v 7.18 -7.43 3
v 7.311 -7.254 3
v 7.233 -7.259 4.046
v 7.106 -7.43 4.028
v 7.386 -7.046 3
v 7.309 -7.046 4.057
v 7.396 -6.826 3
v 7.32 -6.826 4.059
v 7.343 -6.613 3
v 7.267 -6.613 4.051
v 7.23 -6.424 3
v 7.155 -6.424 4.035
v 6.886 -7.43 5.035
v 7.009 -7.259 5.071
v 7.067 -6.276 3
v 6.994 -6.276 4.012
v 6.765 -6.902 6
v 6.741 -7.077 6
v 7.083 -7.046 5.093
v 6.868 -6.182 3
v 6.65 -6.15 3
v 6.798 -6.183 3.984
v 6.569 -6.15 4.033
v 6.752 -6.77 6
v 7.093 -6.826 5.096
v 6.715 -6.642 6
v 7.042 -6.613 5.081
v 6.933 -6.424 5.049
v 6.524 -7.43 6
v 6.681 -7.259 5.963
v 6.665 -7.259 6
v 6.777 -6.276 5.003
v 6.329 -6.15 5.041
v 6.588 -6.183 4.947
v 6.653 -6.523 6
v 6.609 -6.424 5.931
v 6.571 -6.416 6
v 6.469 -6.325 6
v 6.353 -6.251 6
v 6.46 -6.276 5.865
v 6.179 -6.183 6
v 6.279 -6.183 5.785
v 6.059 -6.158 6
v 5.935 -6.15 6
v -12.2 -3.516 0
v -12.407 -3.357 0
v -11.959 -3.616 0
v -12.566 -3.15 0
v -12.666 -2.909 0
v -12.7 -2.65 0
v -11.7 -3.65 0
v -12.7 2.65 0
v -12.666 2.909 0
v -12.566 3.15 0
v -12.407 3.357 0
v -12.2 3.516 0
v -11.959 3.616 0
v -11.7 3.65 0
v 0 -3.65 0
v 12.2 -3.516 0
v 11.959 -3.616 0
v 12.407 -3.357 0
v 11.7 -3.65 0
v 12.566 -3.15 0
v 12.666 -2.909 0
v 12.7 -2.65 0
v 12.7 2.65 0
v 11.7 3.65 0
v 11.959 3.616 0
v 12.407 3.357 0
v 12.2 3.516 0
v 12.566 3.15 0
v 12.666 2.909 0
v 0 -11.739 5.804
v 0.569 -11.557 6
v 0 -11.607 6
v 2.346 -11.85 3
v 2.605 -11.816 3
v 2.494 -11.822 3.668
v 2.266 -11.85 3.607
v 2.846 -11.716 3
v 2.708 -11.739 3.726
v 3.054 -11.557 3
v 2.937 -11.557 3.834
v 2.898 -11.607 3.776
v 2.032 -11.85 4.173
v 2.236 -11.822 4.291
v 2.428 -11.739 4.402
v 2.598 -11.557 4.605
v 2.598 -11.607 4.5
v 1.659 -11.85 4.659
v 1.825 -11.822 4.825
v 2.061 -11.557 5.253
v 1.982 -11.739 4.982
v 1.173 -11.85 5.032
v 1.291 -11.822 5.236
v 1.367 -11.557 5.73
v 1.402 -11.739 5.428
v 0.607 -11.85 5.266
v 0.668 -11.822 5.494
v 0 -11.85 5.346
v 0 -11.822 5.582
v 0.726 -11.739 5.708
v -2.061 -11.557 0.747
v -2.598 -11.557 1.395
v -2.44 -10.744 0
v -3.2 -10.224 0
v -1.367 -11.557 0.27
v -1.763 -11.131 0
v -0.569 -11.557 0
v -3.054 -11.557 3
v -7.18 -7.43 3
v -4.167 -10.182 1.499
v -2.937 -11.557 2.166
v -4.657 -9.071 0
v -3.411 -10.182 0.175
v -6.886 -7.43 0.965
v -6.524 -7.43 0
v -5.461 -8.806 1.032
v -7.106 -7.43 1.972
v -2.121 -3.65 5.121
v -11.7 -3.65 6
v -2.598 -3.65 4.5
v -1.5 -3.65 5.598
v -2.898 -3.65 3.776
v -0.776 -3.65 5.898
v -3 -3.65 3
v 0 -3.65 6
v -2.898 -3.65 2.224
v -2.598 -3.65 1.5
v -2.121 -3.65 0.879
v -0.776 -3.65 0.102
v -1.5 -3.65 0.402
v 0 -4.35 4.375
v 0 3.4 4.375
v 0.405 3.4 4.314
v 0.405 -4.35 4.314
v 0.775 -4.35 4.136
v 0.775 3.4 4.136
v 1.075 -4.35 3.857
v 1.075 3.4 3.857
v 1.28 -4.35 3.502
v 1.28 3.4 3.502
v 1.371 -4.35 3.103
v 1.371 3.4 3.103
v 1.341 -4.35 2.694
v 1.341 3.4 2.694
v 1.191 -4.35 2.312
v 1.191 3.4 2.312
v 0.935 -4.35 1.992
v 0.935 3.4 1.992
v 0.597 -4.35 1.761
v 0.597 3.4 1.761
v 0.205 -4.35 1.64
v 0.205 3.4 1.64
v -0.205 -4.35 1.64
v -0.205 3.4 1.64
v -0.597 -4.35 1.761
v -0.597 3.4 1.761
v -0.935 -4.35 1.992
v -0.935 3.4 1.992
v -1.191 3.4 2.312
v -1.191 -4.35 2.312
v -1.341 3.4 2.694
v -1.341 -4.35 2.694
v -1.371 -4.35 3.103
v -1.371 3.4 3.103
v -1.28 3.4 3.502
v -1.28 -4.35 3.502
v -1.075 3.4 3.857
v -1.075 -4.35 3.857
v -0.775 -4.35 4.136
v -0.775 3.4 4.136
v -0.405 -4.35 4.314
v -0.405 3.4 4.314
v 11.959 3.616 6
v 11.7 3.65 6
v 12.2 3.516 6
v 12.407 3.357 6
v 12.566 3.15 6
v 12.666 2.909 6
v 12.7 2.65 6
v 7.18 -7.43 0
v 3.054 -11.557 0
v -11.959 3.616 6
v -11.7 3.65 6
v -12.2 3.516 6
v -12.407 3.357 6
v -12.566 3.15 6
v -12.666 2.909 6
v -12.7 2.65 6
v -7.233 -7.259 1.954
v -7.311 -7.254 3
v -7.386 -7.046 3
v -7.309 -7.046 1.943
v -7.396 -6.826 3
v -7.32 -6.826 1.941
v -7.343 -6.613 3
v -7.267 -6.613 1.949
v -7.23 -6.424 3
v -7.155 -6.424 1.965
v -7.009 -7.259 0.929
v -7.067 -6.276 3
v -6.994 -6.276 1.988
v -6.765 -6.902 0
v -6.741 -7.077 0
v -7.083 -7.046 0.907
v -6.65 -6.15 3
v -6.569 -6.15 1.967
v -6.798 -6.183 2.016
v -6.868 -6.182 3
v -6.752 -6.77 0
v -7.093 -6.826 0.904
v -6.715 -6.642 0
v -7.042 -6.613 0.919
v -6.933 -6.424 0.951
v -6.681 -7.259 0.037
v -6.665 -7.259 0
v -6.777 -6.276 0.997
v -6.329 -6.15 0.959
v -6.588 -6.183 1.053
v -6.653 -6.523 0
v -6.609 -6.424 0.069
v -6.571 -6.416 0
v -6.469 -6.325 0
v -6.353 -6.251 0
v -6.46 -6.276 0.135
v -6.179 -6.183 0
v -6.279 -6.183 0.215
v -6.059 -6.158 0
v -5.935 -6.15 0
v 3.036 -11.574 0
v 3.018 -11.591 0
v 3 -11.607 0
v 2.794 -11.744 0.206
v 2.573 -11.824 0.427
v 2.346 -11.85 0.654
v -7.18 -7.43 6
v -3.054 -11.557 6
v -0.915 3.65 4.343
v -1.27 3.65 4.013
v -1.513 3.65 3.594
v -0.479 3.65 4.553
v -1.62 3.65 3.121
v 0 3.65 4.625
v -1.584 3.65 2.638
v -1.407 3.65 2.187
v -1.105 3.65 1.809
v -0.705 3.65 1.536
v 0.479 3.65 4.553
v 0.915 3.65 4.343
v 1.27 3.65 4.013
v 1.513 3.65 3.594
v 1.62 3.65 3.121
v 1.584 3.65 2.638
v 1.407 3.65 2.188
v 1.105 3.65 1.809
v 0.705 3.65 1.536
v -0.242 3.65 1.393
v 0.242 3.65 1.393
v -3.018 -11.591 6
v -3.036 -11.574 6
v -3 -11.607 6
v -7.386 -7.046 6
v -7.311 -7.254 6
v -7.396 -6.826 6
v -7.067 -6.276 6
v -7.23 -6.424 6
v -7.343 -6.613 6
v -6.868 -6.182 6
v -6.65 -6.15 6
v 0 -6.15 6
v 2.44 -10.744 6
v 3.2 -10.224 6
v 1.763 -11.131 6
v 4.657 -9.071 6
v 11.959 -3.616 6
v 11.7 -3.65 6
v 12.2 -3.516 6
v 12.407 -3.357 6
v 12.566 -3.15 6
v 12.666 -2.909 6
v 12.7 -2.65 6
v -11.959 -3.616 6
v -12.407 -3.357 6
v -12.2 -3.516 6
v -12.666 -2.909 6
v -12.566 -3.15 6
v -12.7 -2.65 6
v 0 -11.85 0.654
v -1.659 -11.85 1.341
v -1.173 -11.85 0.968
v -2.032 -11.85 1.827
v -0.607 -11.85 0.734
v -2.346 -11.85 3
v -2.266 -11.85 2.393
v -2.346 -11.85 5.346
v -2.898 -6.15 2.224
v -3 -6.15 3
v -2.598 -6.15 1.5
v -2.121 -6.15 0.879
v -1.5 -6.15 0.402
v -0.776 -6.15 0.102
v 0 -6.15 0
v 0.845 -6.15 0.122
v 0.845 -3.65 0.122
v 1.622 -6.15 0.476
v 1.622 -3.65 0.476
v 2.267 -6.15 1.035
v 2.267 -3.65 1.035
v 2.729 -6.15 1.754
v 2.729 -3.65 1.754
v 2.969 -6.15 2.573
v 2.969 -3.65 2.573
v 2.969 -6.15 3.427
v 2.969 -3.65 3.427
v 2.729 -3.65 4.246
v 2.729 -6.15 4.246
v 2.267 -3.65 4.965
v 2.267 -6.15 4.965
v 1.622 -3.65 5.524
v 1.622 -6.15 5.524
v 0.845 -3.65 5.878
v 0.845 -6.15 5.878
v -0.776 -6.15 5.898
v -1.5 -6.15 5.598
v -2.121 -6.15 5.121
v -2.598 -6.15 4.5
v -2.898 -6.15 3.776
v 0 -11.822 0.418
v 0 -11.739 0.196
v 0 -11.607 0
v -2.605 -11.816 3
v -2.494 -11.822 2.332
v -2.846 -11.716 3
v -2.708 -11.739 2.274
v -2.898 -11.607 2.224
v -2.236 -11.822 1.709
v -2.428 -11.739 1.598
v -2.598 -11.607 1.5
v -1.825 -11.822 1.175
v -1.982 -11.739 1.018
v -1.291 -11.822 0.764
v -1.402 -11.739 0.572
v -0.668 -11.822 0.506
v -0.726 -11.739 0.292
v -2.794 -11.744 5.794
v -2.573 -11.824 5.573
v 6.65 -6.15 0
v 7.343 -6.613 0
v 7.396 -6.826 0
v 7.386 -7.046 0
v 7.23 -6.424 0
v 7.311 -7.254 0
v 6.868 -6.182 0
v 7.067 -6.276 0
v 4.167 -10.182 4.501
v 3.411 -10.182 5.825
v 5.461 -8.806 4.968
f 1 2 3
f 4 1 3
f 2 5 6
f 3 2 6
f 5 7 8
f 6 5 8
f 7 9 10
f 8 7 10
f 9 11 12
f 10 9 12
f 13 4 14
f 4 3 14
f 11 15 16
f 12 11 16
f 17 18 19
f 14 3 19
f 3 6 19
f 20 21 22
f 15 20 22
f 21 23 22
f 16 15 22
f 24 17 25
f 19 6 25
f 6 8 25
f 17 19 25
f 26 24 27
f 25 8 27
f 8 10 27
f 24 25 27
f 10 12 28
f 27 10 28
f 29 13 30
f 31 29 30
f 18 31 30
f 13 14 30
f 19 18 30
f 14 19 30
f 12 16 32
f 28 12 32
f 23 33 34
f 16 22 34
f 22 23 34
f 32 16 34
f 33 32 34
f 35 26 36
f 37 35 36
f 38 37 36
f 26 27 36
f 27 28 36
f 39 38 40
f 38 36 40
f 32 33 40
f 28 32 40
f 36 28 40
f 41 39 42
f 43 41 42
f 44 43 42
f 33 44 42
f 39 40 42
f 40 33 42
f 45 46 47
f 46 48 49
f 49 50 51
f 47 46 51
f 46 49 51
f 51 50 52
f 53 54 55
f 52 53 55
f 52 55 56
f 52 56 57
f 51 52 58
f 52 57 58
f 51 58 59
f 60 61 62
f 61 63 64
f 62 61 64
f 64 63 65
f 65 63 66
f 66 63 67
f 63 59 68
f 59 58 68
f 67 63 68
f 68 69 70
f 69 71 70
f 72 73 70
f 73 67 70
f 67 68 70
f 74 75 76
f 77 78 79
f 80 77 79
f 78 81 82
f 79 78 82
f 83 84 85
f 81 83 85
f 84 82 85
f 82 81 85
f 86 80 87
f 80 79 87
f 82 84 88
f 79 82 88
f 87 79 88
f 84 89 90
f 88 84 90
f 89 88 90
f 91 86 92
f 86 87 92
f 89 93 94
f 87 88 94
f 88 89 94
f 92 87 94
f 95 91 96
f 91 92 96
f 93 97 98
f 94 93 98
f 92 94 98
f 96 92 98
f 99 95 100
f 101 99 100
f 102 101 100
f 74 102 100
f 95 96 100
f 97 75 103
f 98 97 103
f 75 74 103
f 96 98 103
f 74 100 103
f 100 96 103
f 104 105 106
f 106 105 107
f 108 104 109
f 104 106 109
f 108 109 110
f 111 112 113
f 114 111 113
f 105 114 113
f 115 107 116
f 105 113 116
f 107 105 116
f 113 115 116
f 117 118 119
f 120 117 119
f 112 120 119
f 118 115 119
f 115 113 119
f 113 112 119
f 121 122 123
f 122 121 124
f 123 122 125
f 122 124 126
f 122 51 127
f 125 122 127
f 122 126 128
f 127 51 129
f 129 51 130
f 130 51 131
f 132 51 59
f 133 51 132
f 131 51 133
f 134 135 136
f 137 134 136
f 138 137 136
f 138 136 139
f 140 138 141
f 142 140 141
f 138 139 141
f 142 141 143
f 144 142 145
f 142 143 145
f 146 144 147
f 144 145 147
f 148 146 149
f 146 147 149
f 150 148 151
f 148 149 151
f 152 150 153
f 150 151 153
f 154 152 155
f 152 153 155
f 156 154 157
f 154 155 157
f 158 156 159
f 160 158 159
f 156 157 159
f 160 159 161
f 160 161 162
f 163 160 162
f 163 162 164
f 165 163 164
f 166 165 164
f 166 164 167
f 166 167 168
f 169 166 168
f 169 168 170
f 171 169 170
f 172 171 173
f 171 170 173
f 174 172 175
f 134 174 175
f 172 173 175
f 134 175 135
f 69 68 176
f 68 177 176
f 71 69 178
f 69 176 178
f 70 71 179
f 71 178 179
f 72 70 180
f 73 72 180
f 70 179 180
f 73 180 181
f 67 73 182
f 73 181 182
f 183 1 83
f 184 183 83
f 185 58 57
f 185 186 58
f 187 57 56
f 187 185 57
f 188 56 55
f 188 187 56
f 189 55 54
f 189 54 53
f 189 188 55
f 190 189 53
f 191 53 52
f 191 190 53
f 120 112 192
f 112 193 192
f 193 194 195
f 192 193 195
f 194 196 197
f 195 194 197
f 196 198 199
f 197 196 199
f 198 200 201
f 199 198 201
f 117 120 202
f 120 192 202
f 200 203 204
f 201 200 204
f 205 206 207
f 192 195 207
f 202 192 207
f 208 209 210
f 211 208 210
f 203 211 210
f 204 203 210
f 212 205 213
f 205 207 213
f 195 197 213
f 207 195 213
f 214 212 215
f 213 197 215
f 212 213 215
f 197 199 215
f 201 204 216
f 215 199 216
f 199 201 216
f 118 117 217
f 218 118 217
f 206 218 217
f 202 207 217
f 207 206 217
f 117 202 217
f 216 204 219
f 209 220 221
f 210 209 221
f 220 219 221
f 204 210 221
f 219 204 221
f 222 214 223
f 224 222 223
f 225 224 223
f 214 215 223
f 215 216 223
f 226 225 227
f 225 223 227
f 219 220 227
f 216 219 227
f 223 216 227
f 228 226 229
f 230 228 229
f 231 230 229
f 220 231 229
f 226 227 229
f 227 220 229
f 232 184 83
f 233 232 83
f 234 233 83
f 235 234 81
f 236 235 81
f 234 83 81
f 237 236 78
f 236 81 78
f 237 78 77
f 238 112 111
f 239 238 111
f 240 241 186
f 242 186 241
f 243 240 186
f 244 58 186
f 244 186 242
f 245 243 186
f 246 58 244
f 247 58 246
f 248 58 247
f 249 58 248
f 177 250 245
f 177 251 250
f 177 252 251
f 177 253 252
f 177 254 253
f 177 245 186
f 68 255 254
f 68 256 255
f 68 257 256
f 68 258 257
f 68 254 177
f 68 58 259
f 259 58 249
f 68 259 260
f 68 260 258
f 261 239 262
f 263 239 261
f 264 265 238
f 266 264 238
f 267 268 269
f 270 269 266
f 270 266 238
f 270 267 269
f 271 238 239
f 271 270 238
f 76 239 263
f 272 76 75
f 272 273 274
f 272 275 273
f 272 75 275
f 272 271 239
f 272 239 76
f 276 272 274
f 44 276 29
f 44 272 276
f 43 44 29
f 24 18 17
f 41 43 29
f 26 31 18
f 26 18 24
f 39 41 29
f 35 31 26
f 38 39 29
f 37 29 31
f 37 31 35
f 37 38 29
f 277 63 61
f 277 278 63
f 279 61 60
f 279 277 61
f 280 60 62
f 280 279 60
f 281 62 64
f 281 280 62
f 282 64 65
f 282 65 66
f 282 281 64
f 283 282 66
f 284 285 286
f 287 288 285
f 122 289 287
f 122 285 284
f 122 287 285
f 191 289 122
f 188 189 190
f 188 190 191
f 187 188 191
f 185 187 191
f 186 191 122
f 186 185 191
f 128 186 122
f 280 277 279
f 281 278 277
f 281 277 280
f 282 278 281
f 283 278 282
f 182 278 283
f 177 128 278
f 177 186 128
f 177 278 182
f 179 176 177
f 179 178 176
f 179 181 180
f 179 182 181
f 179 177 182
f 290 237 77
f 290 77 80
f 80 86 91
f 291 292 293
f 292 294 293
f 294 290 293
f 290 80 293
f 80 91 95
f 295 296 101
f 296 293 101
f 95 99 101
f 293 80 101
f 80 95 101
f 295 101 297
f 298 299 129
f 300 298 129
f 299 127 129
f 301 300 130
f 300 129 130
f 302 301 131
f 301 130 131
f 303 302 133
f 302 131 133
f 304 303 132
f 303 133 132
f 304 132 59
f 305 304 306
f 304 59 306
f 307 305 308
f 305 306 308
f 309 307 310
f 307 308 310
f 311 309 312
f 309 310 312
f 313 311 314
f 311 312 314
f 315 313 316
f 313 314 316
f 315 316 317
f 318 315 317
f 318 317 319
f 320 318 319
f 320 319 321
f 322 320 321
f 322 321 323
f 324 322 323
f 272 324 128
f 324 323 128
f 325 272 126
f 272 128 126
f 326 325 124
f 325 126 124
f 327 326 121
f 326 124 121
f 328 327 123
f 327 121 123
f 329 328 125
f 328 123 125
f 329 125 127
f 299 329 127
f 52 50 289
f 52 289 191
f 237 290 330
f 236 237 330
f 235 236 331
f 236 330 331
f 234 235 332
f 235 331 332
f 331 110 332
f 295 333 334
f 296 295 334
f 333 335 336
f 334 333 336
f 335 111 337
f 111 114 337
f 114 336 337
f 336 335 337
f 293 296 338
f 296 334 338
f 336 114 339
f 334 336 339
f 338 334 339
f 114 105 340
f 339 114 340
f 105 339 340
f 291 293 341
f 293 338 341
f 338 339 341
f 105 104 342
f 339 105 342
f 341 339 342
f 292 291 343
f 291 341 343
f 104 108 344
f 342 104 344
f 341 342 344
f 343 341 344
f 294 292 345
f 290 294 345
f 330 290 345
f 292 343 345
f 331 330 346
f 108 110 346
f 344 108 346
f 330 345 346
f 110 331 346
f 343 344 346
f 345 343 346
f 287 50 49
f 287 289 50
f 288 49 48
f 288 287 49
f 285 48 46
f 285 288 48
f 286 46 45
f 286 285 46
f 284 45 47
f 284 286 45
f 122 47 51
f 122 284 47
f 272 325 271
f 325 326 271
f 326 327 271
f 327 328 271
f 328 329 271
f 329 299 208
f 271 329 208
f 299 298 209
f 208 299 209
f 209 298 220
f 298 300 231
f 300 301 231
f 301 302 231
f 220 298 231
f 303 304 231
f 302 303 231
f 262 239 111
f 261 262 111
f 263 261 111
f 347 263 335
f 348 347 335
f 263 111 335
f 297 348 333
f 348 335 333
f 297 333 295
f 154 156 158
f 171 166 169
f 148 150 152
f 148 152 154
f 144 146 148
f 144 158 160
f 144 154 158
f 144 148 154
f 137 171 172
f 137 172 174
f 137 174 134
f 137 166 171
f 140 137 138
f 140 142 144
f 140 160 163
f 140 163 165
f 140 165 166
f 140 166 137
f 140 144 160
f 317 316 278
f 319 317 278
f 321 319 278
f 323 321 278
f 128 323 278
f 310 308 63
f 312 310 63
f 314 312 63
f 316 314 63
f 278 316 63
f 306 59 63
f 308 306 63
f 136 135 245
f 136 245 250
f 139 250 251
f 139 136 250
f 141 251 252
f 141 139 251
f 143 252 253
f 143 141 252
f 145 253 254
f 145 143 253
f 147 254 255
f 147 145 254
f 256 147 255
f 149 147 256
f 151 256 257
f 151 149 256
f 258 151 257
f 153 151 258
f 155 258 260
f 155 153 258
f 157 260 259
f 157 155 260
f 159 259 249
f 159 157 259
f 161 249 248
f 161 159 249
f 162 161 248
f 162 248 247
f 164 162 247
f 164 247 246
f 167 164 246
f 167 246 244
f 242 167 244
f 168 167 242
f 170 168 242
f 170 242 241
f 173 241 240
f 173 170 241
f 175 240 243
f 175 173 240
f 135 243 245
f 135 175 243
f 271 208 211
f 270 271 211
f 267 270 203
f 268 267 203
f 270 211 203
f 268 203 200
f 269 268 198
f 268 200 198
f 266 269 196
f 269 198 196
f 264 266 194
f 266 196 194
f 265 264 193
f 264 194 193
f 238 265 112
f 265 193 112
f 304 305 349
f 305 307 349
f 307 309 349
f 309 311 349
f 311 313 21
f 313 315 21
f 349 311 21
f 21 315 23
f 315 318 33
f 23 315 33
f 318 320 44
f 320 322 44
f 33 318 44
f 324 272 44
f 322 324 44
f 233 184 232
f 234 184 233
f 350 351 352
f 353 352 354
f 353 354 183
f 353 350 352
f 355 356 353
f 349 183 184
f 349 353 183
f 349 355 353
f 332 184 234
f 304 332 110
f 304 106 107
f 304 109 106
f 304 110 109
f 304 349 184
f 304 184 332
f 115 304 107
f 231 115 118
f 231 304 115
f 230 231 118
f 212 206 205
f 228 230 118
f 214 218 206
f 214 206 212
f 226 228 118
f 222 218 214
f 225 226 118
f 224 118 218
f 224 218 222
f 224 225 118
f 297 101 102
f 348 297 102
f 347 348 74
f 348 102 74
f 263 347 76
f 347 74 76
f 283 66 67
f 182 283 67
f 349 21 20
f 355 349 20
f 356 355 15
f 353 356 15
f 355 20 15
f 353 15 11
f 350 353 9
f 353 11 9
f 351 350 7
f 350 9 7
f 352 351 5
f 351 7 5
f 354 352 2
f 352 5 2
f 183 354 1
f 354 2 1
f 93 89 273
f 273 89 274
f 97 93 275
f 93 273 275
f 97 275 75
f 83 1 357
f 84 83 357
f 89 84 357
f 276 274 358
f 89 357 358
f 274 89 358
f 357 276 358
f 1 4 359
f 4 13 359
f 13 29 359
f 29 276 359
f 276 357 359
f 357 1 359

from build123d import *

# Parameters (mm, degrees)
SKETCH1_W               = 25.4
SKETCH1_H               = 7.3
BOSS_EXTRUDE1_DEPTH     = 6
SKETCH3_W               = 4.4
SKETCH3_H               = 5.7
CUT_EXTRUDE1_DEPTH      = 21.24530815
CUT_EXTRUDE1_DEPTH_BACK = 21.24530815
BOSS_EXTRUDE3_START     = -3
BOSS_EXTRUDE3_DEPTH     = 3
BOSS_EXTRUDE4_START     = -3
BOSS_EXTRUDE4_DEPTH     = 3
FILLET1_R               = 1
CUT_EXTRUDE2_DEPTH      = 19.376955775
CUT_EXTRUDE3_DEPTH      = 19.376955775
SKETCH9_R               = 1.375
CUT_EXTRUDE4_DEPTH      = 8
CHAMFER1_SIZE           = 0.25


with BuildPart() as part:
    # Sketch1 → Boss-Extrude1 (new body)
    with BuildSketch(Plane.XY):
        Rectangle(SKETCH1_W, SKETCH1_H)
    extrude(amount=BOSS_EXTRUDE1_DEPTH)

    # Sketch2 → Revolve1 (revolve)
    with BuildSketch(Plane.XY.offset(3), mode=Mode.PRIVATE) as revolve1_sk:
        with BuildLine():
            Line((6.65, -6.15), (3, -6.15))
            Line((3, -6.15), (3, -3.65))
            Line((3, -3.65), (0, -3.65))
            Line((0, -3.65), (0, -11.85))
            Line((0, -11.85), (2.346446609, -11.85))
            ThreePointArc((2.346446609, -11.85), (2.729130042, -11.773879533), (3.053553391, -11.557106781))
            Line((3.053553391, -11.557106781), (7.180330086, -7.430330086))
            ThreePointArc((7.180330086, -7.430330086), (7.342909649, -6.612987426), (6.65, -6.15))
        make_face()
    revolve(revolve1_sk.sketch.rotate(Axis((0, 0, 3), (0, -1, 0)), 180), axis=Axis((0, 0, 3), (0, -1, 0)))

    # Sketch3 → Cut-Extrude1 (cut, two sides)
    with BuildSketch(Plane(origin=(0, 0, 0), x_dir=(0, 0, -1), z_dir=(1, 0, 0))) as cut_extrude1_sk:
        with Locations((-8.2, -9)):
            Rectangle(SKETCH3_W, SKETCH3_H)
        with Locations((2.2, -9)):
            Rectangle(SKETCH3_W, SKETCH3_H)
    extrude(amount=CUT_EXTRUDE1_DEPTH, mode=Mode.SUBTRACT)
    extrude(cut_extrude1_sk.sketch, amount=-CUT_EXTRUDE1_DEPTH_BACK, mode=Mode.SUBTRACT)

    # Sketch5 → Boss-Extrude3 (add)
    with BuildSketch(Plane(origin=(0, 0, 0), x_dir=(-1, 0, 0), z_dir=(0, 0, -1)).offset(BOSS_EXTRUDE3_START)):
        with BuildLine():
            Line((-7.180330086, -7.430330086), (-3.053553391, -11.557106781))
            ThreePointArc((-3.053553391, -11.557106781), (-2.729130042, -11.773879533), (-2.346446609, -11.85))
            Line((-2.346446609, -11.85), (0, -11.85))
            Line((0, -11.85), (0, -6.15))
            Line((0, -6.15), (-6.65, -6.15))
            ThreePointArc((-6.65, -6.15), (-7.342909649, -6.612987426), (-7.180330086, -7.430330086))
        make_face()
    extrude(amount=BOSS_EXTRUDE3_DEPTH)

    # Sketch6 → Boss-Extrude4 (add)
    with BuildSketch(Plane.XY.offset(6).offset(BOSS_EXTRUDE4_START)):
        with BuildLine():
            Line((0, -11.85), (0, -11.606880417))
            add(Edge.make_bspline(
                [(-0.569375368, -11.557106781), (-0.477136244, -11.574305984), (-0.383216001, -11.587587431), (-0.288131205, -11.597299525), (-0.192322641, -11.603685849), (-0.096171282, -11.606880411), (0, -11.606880417)],
                knots=[0, 0, 0, 0, 0, 0, 0, 0.500004034, 0.500004034, 0.500004034, 0.500004034, 0.500004034, 0.500004034, 0.500004034], degree=6))
            add(Edge.make_bspline(
                [(-0.569375368, -11.557106781), (-2.345972894, -11.225836703), (-6.523583382, -7.430330086)],
                knots=[0.188670459, 0.188670459, 0.188670459, 1.519069158, 1.519069158, 1.519069158], degree=2, weights=[1, 1.229524605, 1]))
            add(Edge.make_bspline(
                [(-6.523583382, -7.430330086), (-6.548217839, -7.407948812), (-6.57163623, -7.384387754), (-6.593752622, -7.359710949), (-6.614485917, -7.333990738), (-6.633761234, -7.307307749), (-6.688090057, -7.222962512), (-6.718198081, -7.1624526), (-6.741231365, -7.099013892), (-6.756763407, -7.033555882), (-6.764556488, -6.967070385), (-6.764657168, -6.849785487), (-6.760183262, -6.798976266), (-6.751191088, -6.748616972), (-6.737758143, -6.699153447), (-6.720033498, -6.651010063), (-6.68841653, -6.583676772), (-6.677775298, -6.563121343), (-6.666326858, -6.542947595), (-6.654092776, -6.523189068), (-6.641096757, -6.503877463), (-6.605240936, -6.454697957), (-6.581206245, -6.425590465), (-6.555368287, -6.397845087), (-6.527846234, -6.371572034), (-6.498768133, -6.346867107), (-6.393778747, -6.267504617), (-6.310809109, -6.22103841), (-6.221317835, -6.185601518), (-6.127427397, -6.161840052), (-6.031244011, -6.15), (-5.934854674, -6.15)],
                knots=[0, 0, 0, 0, 0, 0, 0, 0.107806274, 0.107806274, 0.107806274, 0.107806274, 0.107806274, 0.32997016, 0.32997016, 0.32997016, 0.32997016, 0.32997016, 0.499739877, 0.499739877, 0.499739877, 0.499739877, 0.499739877, 0.576163763, 0.576163763, 0.576163763, 0.576163763, 0.576163763, 0.699289859, 0.699289859, 0.699289859, 0.699289859, 0.699289859, 1, 1, 1, 1, 1, 1, 1], degree=6))
            Line((-5.934854674, -6.15), (-6.65, -6.15))
            ThreePointArc((-6.65, -6.15), (-7.342909649, -6.612987426), (-7.180330086, -7.430330086))
            Line((-7.180330086, -7.430330086), (-3.053553391, -11.557106781))
            ThreePointArc((-3.053553391, -11.557106781), (-2.729130042, -11.773879533), (-2.346446609, -11.85))
            Line((-2.346446609, -11.85), (0, -11.85))
        make_face()
    extrude(amount=BOSS_EXTRUDE4_DEPTH)

    # Fillet1
    fillet1_edges = [part.edges().sort_by_distance(p)[0] for p in [
        (12.7, -3.65, 3),
        (-12.7, -3.65, 3),
        (-12.7, 3.65, 3),
        (12.7, 3.65, 3),
    ]]
    fillet(fillet1_edges, radius=FILLET1_R)

    # Sketch7 → Cut-Extrude2 (cut, through all)
    with BuildSketch(Plane.ZY):
        with BuildLine():
            Line((0, -11.606880417), (0, -11.85))
            Line((0, -11.85), (0.653553391, -11.85))
            ThreePointArc((0.653553391, -11.85), (0.304899133, -11.787251412), (0, -11.606880417))
        make_face()
    extrude(amount=-CUT_EXTRUDE2_DEPTH, mode=Mode.SUBTRACT)

    # Sketch8 → Cut-Extrude3 (cut, through all)
    with BuildSketch(Plane(origin=(0, 0, 0), x_dir=(0, 0, -1), z_dir=(1, 0, 0))):
        with BuildLine():
            Line((-6, -11.606880417), (-6, -11.85))
            Line((-6, -11.85), (-5.346446609, -11.85))
            ThreePointArc((-5.346446609, -11.85), (-5.695100867, -11.787251412), (-6, -11.606880417))
        make_face()
    extrude(amount=-CUT_EXTRUDE3_DEPTH, mode=Mode.SUBTRACT)

    # Sketch9 → Cut-Extrude4 (cut)
    with BuildSketch(Plane(origin=(0, 3.65, 0), x_dir=(1, 0, 0), z_dir=(0, 1, 0))):
        with Locations(Location((0, -3, 0), (0, 0, 270))):
            Circle(SKETCH9_R)
    extrude(amount=-CUT_EXTRUDE4_DEPTH, mode=Mode.SUBTRACT)

    # Chamfer1
    chamfer1_edges = [part.edges().sort_by_distance(p)[0] for p in [
        (0, 3.65, 1.625),
    ]]
    chamfer(chamfer1_edges, length=CHAMFER1_SIZE)


solid = part.part
